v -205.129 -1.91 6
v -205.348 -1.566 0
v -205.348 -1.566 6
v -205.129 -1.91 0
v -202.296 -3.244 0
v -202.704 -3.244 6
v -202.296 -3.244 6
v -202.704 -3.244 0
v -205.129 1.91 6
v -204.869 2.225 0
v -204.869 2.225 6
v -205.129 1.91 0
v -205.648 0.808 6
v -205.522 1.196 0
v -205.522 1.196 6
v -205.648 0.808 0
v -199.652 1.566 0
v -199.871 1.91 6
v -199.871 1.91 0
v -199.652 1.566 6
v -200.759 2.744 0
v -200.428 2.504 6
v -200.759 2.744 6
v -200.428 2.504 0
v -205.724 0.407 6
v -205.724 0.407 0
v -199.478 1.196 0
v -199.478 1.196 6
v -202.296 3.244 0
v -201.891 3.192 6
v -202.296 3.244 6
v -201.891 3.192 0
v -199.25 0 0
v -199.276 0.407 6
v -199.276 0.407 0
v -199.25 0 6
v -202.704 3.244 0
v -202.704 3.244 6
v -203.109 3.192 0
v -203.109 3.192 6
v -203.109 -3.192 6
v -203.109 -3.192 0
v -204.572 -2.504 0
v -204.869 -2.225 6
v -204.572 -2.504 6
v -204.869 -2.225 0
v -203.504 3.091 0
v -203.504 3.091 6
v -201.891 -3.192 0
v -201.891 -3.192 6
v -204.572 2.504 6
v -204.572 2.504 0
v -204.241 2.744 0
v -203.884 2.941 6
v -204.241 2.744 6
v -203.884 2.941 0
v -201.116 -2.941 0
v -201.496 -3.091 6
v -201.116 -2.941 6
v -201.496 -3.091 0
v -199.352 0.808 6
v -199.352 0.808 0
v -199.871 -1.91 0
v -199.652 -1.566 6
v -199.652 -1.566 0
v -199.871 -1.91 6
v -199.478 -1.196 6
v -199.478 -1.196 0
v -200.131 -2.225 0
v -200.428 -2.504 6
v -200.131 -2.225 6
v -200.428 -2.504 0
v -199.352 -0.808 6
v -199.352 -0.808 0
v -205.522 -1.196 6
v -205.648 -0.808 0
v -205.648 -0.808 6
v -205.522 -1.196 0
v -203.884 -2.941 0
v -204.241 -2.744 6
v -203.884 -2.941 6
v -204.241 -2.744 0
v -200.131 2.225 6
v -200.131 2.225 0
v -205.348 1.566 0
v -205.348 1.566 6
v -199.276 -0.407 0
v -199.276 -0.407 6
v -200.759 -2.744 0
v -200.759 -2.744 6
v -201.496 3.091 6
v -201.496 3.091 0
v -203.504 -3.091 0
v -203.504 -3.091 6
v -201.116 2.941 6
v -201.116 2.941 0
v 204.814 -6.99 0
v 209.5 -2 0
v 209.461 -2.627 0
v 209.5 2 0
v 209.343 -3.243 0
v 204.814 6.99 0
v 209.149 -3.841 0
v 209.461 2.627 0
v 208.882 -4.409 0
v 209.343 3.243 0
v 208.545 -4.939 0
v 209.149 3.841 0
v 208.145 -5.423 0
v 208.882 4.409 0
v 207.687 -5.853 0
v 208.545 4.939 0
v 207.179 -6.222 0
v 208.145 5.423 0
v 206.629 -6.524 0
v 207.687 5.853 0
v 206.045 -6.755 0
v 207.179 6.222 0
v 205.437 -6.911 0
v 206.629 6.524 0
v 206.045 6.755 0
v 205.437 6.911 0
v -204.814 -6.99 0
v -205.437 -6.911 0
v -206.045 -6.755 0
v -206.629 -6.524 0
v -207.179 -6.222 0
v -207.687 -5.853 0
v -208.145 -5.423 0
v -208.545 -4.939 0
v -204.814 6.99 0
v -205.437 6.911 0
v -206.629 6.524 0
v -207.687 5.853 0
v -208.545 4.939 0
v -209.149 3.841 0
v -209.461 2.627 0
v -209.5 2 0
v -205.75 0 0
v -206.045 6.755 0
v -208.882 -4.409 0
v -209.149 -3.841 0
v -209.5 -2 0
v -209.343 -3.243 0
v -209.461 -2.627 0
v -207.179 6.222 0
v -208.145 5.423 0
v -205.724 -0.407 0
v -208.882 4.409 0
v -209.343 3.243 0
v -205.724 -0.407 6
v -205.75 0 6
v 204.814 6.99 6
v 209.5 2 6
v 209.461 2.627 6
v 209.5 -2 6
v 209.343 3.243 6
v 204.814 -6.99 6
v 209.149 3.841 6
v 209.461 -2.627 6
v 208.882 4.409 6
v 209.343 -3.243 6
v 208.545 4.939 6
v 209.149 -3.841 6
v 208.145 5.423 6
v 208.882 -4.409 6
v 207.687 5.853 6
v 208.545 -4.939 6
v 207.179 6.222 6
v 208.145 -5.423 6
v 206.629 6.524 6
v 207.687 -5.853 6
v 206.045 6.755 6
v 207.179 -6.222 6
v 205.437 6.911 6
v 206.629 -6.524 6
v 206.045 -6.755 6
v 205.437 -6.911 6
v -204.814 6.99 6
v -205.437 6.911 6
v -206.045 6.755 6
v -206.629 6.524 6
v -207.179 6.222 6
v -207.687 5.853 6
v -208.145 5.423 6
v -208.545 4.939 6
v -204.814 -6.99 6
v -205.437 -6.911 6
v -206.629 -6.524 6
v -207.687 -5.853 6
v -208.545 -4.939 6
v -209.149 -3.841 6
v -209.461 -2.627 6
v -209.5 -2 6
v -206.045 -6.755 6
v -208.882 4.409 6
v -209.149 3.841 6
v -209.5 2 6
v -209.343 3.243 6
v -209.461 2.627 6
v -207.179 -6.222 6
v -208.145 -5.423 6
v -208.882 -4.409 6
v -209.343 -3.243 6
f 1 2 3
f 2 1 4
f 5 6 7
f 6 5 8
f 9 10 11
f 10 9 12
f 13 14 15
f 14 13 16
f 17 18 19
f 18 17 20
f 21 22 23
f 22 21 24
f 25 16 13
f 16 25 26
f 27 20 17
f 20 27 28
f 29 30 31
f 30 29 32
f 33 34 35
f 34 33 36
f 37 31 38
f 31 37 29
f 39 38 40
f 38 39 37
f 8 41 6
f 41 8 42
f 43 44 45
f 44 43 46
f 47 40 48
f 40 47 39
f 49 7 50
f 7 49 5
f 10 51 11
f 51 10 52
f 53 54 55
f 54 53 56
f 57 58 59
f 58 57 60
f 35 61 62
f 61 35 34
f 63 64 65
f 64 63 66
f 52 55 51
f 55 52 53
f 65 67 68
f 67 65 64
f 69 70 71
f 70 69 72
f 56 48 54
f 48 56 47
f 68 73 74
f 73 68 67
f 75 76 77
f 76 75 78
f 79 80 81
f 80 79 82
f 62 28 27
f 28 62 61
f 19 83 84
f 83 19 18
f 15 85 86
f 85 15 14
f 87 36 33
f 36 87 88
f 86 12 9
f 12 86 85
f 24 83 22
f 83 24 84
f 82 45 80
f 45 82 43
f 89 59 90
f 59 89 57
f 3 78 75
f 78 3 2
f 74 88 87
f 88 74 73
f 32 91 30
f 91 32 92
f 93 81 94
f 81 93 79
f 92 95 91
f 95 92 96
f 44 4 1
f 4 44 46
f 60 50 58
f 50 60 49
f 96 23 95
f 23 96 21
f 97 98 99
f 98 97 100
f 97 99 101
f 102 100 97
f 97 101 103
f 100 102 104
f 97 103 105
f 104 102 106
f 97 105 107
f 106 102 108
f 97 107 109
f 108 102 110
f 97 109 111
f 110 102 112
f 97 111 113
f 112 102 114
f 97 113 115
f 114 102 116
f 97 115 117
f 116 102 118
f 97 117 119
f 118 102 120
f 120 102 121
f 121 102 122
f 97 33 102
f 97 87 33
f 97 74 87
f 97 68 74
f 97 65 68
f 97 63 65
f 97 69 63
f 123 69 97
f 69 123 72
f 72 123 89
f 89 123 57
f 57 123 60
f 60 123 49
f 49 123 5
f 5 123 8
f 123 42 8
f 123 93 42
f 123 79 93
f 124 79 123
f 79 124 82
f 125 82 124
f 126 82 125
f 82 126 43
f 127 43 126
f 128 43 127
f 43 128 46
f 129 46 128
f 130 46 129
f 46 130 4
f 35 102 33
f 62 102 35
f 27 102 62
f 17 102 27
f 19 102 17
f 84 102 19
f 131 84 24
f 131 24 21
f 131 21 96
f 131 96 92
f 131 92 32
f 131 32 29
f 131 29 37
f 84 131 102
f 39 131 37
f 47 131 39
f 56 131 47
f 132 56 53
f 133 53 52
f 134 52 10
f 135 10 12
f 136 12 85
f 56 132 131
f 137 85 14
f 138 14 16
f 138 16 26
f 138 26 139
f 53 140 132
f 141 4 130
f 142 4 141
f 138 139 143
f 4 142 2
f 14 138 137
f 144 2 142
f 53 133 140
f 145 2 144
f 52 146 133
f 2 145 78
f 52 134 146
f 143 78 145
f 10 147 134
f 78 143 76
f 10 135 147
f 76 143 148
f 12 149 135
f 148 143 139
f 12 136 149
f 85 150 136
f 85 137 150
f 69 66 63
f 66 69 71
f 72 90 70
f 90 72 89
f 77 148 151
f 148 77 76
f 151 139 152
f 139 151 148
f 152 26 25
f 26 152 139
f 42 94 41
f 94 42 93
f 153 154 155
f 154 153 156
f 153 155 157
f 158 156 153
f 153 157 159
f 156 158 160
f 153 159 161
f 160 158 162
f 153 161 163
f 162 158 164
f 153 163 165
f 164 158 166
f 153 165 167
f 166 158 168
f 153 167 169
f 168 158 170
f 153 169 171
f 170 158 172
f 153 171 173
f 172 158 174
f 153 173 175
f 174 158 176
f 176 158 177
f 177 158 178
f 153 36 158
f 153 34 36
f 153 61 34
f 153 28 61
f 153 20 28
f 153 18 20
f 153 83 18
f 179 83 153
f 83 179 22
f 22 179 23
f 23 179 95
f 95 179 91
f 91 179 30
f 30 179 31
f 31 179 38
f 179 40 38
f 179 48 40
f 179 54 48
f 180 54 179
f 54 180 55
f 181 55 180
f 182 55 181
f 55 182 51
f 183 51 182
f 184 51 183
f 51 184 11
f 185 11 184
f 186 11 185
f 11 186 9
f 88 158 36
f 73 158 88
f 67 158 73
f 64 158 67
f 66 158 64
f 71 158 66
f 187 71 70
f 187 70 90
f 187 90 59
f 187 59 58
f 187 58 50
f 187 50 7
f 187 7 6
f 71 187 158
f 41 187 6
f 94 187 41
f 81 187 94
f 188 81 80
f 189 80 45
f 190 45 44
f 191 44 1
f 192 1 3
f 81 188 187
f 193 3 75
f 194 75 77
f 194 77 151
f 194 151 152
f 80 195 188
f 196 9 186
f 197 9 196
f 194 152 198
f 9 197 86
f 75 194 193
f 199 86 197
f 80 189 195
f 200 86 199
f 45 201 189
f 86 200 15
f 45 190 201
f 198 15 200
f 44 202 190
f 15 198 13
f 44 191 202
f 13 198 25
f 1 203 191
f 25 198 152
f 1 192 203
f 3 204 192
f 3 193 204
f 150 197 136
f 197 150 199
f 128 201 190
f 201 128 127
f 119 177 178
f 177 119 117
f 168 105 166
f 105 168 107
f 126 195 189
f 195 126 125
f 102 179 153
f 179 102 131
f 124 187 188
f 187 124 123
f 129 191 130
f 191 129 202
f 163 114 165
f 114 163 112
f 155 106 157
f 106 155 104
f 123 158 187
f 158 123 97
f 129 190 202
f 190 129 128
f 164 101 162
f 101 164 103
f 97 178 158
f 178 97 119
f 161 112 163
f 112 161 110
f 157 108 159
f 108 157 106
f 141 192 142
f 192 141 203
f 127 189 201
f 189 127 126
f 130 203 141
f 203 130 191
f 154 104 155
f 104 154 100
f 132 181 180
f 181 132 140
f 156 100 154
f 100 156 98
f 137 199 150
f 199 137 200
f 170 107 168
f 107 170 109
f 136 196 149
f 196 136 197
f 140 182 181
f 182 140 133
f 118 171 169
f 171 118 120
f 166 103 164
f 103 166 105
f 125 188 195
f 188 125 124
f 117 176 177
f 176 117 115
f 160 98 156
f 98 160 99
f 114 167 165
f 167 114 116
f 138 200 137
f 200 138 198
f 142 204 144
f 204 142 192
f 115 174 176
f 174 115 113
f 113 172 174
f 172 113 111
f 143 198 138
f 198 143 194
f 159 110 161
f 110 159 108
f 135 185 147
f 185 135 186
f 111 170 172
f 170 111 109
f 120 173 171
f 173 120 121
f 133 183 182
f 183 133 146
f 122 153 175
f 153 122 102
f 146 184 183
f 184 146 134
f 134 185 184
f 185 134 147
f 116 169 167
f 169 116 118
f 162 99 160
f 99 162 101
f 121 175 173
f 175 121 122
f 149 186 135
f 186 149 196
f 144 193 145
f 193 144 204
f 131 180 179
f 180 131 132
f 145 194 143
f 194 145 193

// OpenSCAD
$fn = 50;


difference() {
	union() {
		hull() {
			translate(v = [-204.5000000000, 2.0000000000, 0]) {
				cylinder(h = 6, r = 5);
			}
			translate(v = [204.5000000000, 2.0000000000, 0]) {
				cylinder(h = 6, r = 5);
			}
			translate(v = [-204.5000000000, -2.0000000000, 0]) {
				cylinder(h = 6, r = 5);
			}
			translate(v = [204.5000000000, -2.0000000000, 0]) {
				cylinder(h = 6, r = 5);
			}
		}
	}
	union() {
		translate(v = [-202.5000000000, 0.0000000000, 0]) {
			cylinder(h = 6, r = 3.2500000000);
		}
		translate(v = [-202.5000000000, 0.0000000000, 0]) {
			cylinder(h = 6, r = 1.8000000000);
		}
		translate(v = [-202.5000000000, 0.0000000000, 0]) {
			cylinder(h = 6, r = 1.8000000000);
		}
		translate(v = [-202.5000000000, 0.0000000000, 0]) {
			cylinder(h = 6, r = 1.8000000000);
		}
	}
}
